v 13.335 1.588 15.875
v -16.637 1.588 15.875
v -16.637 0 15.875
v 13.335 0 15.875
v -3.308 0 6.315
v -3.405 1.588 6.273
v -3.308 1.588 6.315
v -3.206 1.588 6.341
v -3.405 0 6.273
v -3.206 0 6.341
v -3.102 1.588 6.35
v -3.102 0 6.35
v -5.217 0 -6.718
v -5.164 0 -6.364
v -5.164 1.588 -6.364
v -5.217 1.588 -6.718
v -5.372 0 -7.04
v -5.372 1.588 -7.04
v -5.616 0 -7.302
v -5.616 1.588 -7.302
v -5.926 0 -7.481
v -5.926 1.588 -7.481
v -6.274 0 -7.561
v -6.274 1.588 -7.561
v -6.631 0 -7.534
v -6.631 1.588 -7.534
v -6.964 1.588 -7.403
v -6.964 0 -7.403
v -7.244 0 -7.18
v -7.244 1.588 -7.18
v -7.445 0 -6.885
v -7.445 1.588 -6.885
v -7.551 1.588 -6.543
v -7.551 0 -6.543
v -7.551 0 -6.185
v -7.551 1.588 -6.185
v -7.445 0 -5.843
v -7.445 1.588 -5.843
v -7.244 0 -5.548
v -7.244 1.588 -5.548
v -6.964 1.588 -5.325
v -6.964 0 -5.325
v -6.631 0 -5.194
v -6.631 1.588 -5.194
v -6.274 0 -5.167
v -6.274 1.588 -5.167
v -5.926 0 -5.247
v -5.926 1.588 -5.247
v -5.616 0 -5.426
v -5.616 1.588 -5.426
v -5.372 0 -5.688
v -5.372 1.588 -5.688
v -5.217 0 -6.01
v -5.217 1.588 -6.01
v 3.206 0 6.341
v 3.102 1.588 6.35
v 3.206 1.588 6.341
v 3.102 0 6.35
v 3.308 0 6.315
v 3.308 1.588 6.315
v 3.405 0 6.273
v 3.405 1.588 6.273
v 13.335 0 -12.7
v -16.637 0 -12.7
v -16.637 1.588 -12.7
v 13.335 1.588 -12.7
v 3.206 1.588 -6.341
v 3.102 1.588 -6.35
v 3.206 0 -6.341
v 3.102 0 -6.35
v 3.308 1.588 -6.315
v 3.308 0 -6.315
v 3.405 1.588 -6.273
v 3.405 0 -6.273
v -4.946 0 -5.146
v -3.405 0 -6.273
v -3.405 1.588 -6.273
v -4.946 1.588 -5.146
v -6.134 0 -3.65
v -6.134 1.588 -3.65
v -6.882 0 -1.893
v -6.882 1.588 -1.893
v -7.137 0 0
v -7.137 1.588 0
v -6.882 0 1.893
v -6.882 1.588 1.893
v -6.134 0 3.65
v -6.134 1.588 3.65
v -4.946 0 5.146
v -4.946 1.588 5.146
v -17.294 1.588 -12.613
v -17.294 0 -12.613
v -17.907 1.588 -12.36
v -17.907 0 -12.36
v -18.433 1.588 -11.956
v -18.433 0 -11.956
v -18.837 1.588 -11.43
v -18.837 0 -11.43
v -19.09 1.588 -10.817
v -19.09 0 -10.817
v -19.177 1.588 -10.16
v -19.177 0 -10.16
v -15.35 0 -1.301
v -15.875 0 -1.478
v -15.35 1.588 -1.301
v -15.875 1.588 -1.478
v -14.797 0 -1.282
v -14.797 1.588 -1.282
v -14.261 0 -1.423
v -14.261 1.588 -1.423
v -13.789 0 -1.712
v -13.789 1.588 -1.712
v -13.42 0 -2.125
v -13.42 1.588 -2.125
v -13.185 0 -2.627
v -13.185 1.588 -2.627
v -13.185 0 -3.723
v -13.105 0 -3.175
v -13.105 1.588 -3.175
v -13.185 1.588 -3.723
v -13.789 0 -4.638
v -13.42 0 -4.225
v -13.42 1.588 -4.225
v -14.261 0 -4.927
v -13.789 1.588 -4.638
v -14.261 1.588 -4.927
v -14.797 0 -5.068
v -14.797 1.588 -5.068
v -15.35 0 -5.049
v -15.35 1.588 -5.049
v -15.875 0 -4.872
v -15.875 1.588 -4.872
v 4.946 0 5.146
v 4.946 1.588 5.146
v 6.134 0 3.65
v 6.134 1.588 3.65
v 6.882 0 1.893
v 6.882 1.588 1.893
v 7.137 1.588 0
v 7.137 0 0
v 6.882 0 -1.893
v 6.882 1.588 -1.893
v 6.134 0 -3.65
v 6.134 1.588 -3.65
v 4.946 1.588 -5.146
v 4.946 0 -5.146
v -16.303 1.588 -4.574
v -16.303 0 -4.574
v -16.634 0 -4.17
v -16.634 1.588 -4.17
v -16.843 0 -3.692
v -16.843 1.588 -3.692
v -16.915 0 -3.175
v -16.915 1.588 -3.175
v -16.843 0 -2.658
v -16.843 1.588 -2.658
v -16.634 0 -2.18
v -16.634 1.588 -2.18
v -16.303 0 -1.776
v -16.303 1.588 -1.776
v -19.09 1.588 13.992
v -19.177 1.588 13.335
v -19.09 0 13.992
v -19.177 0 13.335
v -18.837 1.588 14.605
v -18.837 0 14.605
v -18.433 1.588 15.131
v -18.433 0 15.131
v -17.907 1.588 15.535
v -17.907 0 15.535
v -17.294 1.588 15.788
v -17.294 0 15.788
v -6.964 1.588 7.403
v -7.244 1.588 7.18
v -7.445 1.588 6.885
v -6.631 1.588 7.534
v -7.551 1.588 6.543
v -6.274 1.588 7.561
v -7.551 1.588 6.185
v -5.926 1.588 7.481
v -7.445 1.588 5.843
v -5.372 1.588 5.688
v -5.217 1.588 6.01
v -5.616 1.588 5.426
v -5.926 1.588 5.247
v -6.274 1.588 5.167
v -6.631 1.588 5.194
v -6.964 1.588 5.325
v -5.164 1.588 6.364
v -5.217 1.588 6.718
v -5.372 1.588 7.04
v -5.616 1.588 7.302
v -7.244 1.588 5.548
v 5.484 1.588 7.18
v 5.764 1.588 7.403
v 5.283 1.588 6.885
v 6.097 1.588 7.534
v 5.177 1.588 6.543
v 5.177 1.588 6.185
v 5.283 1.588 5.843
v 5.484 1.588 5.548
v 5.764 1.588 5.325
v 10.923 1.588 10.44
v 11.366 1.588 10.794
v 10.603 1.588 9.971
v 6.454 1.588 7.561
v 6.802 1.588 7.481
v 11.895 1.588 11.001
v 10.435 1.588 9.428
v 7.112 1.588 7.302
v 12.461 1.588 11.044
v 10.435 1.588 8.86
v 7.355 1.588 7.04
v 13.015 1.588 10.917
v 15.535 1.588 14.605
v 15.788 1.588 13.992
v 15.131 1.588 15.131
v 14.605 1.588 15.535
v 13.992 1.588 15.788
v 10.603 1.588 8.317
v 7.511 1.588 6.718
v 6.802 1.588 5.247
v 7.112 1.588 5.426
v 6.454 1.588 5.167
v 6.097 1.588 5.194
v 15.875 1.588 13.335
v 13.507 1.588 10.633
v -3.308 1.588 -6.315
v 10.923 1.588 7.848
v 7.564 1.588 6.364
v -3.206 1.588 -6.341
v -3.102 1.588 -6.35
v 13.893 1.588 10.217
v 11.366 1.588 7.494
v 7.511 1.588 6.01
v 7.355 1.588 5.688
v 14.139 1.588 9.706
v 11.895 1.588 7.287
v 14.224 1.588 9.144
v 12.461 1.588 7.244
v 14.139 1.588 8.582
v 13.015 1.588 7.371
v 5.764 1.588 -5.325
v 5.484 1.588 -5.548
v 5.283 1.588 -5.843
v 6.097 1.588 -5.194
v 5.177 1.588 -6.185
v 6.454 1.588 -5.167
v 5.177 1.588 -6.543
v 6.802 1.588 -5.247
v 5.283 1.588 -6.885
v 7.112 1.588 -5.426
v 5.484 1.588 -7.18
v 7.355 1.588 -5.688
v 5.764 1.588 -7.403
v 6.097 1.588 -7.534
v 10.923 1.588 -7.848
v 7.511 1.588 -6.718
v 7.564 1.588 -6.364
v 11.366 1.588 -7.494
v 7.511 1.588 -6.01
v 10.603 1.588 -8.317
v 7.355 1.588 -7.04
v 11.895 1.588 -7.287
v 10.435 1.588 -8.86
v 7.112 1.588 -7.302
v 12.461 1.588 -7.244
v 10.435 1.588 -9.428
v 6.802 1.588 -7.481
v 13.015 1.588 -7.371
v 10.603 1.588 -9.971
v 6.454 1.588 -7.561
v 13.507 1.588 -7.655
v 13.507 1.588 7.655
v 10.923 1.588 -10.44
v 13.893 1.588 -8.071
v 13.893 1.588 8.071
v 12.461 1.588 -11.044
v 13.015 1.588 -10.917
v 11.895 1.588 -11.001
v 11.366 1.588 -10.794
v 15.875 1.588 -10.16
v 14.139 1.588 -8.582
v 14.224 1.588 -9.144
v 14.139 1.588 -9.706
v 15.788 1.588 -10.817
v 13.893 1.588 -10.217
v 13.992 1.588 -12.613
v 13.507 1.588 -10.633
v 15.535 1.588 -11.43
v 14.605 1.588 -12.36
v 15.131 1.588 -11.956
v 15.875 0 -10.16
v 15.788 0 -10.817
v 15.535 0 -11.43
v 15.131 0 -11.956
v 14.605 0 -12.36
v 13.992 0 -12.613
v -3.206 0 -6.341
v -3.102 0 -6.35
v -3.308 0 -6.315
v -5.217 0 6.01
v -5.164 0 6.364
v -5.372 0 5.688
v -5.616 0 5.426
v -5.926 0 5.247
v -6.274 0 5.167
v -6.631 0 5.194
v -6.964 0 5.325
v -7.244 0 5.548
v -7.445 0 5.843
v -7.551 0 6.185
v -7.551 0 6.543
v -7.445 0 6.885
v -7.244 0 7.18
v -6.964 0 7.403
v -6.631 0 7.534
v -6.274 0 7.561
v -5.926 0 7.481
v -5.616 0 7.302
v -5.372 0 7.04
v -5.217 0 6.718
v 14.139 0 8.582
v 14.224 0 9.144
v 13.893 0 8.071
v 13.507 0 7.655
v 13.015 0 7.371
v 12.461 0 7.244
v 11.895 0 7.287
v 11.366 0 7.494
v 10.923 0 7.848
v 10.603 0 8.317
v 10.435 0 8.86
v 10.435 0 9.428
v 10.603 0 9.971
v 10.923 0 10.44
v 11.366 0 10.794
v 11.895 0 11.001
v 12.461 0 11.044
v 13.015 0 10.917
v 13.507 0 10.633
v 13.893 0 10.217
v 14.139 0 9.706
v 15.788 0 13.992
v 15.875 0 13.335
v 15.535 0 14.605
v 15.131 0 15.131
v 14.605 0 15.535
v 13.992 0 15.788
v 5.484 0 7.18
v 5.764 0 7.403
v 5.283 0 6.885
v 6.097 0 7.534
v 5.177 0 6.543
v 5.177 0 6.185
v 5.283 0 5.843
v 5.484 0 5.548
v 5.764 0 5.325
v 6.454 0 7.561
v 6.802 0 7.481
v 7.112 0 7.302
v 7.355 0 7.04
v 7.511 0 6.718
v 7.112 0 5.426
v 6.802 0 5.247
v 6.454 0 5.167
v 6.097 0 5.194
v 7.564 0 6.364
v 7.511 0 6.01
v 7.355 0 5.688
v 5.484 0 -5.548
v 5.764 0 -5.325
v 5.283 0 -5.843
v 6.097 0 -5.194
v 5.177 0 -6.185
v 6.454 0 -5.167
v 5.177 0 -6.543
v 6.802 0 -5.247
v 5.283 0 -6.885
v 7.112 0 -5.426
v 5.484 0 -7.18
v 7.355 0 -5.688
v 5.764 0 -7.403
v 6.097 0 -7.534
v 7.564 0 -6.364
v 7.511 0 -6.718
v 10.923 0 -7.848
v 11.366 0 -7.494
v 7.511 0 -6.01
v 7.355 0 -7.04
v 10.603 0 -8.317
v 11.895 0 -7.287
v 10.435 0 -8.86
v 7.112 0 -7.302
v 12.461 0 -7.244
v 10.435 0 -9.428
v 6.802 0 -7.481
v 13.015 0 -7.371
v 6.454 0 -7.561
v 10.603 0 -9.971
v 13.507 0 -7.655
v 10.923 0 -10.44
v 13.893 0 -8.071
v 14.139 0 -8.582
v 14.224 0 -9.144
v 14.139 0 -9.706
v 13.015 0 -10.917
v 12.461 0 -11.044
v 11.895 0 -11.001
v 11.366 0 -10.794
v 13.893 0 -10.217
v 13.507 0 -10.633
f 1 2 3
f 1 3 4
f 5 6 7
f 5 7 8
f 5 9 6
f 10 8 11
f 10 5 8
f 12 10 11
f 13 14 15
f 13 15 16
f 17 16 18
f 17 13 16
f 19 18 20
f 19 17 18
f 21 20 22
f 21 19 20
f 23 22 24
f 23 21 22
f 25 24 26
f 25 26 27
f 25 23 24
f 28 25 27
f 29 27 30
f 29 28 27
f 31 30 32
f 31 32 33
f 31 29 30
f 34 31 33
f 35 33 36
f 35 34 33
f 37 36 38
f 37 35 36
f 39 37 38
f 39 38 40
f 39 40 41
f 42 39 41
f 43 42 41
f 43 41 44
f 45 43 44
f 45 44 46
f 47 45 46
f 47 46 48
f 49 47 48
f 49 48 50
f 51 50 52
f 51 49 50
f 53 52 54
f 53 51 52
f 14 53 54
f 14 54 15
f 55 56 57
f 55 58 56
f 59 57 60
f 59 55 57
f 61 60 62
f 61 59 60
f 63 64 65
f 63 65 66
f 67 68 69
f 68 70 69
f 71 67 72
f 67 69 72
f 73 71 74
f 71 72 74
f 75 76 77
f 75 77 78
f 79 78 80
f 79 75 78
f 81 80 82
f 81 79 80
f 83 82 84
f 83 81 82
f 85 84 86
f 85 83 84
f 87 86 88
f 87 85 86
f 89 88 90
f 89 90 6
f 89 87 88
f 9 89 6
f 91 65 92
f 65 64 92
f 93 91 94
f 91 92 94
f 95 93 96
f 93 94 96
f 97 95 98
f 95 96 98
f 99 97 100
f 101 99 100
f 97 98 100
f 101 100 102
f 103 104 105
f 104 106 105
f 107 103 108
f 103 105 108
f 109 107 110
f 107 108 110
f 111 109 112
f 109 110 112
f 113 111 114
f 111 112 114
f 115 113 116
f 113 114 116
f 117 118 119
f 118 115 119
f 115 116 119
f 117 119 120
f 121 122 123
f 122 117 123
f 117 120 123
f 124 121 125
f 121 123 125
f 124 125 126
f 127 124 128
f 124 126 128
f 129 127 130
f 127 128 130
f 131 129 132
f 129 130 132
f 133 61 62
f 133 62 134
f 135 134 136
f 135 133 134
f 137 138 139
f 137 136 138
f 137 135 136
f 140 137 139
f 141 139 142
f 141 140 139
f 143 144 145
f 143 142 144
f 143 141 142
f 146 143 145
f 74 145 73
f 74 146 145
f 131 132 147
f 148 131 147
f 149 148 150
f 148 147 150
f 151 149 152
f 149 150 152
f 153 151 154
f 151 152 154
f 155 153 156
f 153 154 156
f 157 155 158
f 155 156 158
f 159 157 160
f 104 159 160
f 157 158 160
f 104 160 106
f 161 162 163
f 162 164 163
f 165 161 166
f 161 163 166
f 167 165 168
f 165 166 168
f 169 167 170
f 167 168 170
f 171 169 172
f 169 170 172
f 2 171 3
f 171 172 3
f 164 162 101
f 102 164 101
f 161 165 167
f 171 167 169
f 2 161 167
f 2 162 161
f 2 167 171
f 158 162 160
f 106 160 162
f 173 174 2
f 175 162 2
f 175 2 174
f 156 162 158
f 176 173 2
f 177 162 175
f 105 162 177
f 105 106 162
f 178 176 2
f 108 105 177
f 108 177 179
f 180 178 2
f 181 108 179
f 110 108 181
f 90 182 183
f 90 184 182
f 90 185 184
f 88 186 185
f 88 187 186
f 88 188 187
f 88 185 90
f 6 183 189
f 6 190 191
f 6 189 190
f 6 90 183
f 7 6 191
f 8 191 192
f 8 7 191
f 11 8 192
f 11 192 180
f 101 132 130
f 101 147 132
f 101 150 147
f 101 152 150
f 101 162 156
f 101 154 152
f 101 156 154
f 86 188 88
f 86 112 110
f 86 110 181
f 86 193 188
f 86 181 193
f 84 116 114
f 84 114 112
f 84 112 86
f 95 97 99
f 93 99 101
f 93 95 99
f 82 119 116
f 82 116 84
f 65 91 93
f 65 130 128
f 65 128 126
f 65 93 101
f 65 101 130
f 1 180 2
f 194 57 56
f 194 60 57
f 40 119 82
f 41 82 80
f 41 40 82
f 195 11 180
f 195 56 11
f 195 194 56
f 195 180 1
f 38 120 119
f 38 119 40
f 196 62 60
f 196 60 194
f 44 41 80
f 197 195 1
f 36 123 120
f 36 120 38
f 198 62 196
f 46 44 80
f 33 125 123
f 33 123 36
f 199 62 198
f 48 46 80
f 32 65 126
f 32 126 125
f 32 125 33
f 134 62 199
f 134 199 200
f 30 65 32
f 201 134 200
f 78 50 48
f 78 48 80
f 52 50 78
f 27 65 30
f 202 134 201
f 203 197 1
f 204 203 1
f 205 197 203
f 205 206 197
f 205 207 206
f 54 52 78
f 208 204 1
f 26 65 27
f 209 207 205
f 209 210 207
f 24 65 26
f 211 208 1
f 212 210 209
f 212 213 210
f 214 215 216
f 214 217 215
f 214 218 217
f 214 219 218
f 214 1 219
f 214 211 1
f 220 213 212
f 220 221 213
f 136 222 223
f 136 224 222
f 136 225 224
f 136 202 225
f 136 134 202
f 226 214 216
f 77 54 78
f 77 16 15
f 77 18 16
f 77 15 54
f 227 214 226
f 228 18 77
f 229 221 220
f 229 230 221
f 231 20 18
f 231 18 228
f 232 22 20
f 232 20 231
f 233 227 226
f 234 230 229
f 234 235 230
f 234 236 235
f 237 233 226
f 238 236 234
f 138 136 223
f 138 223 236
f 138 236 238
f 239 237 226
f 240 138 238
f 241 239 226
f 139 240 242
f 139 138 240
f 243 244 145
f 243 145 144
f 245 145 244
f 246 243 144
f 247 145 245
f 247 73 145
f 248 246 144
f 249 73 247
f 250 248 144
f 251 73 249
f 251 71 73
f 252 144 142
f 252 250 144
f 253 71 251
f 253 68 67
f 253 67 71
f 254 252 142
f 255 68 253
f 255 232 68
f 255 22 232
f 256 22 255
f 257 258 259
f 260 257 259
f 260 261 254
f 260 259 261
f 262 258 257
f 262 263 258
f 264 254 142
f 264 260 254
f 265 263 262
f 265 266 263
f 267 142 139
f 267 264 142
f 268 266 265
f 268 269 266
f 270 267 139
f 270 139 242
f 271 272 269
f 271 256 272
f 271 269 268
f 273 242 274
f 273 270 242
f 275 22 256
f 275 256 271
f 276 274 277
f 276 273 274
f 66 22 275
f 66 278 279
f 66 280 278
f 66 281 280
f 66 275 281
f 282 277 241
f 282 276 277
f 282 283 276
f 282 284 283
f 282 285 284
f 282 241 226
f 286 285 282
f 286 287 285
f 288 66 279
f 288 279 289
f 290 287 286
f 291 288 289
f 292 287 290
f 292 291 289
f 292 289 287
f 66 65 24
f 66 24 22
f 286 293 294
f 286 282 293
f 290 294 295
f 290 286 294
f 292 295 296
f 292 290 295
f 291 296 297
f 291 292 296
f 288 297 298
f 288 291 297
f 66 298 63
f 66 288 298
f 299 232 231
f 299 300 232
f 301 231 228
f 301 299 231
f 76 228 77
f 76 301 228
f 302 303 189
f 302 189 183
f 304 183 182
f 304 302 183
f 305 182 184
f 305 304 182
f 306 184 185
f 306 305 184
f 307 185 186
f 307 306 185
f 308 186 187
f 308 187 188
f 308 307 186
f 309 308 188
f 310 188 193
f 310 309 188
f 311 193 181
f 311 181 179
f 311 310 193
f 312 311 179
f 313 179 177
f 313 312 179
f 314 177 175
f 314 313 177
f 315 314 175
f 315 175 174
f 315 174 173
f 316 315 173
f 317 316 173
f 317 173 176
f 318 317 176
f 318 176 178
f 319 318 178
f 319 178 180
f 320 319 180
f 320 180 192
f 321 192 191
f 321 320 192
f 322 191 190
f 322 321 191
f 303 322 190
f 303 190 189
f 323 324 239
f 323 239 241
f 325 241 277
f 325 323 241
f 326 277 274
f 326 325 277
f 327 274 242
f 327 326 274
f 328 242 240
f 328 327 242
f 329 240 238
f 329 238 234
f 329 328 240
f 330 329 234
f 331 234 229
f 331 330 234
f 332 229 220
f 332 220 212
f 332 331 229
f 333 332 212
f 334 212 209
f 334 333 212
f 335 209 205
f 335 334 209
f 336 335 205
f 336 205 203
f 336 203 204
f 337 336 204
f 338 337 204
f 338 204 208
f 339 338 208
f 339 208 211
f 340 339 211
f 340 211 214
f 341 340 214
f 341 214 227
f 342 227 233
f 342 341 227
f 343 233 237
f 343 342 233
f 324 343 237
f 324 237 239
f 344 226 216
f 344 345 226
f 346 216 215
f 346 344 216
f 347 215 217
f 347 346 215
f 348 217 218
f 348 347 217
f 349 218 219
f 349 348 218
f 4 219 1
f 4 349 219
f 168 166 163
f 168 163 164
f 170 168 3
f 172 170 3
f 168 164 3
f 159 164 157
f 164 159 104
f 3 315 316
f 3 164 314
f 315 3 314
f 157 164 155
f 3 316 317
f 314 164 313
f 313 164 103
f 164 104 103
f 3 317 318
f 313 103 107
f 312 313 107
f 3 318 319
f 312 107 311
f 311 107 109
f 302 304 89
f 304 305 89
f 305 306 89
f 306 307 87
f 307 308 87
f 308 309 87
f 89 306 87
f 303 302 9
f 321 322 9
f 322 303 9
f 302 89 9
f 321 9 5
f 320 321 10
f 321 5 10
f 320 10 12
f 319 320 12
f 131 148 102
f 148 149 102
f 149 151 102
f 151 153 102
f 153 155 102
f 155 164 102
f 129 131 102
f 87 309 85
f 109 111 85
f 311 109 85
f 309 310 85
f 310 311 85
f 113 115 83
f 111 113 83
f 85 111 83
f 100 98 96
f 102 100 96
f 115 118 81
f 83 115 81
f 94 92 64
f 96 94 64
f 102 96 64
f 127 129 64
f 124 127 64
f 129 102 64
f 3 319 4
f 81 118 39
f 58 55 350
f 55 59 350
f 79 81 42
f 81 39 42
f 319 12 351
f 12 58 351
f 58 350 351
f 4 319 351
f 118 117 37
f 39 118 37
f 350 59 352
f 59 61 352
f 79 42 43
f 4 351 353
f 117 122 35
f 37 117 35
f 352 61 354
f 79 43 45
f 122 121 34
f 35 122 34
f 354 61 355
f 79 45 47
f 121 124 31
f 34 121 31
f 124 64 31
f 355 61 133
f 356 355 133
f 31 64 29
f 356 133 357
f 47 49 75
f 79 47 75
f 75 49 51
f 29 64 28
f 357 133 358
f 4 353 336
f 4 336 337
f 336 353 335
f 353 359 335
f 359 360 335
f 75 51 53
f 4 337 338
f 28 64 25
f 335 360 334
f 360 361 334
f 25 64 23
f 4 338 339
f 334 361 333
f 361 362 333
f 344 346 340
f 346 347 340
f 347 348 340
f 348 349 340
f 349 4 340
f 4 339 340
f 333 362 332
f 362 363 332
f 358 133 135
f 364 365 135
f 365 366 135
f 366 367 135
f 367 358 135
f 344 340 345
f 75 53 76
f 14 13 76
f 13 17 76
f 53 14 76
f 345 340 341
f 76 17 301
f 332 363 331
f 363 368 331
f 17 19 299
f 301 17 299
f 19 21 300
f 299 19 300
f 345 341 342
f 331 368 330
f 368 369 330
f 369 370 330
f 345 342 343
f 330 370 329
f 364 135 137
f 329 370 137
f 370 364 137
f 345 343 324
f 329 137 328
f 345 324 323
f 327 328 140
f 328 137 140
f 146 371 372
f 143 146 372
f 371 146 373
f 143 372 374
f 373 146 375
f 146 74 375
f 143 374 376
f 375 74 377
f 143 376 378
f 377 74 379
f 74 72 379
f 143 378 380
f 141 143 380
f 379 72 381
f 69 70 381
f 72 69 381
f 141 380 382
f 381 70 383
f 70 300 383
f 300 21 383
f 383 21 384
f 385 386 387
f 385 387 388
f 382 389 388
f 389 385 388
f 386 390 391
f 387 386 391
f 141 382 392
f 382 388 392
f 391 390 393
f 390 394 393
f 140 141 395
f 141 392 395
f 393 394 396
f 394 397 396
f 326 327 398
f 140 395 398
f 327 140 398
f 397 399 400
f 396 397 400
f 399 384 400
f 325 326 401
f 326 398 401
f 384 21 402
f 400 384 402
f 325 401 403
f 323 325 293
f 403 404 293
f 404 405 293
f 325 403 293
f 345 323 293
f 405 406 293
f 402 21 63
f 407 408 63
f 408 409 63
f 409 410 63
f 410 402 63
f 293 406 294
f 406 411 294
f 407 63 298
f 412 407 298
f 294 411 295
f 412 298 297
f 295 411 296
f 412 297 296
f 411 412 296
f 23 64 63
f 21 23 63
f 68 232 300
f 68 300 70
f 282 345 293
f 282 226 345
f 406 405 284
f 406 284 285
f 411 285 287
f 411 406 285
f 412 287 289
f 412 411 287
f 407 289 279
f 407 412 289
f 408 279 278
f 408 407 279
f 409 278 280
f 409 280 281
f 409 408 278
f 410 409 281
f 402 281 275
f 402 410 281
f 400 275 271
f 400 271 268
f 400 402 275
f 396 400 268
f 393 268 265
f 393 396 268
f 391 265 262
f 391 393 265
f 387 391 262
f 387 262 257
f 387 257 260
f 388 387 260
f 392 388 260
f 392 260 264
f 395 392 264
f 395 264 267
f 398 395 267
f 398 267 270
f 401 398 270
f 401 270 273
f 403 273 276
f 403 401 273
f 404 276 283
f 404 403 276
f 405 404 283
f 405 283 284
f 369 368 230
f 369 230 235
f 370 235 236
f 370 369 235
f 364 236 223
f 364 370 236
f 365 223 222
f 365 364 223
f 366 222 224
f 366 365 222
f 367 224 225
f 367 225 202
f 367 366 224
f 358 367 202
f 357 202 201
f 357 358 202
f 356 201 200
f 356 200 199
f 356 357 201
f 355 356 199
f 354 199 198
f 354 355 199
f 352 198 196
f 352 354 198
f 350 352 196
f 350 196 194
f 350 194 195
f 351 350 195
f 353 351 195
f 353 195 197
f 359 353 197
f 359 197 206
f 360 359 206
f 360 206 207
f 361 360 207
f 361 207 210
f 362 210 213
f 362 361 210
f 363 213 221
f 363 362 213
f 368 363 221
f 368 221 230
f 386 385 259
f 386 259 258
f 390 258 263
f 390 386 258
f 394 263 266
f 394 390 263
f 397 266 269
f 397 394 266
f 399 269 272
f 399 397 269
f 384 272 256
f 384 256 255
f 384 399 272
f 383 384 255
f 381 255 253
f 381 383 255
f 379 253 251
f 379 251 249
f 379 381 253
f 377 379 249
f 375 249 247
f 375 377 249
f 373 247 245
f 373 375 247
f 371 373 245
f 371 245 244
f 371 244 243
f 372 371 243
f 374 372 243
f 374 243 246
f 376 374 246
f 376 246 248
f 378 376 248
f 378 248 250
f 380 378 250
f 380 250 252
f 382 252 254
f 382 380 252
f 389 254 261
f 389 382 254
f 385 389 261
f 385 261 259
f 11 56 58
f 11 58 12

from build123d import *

# Parameters (mm, degrees)
SKETCH1_W           = 31.75
SKETCH1_H           = 25.4
SKETCH1_R           = 7.1374
SKETCH1_R_2         = 1.2
SKETCH1_R_3         = 1.905
BOSS_EXTRUDE1_DEPTH = 1.5875
SKETCH2_W           = 31.75
SKETCH2_H           = 3.175
BOSS_EXTRUDE2_DEPTH = 1.5875
SKETCH5_R           = 1.905
BOSS_EXTRUDE4_DEPTH = 1.5875
SKETCH6_R           = 1.905
CUT_EXTRUDE1_DEPTH  = 2.5875
BOSS_EXTRUDE3_DEPTH = 1.5875
FILLET2_R           = 0.635
FILLET3_R           = 2.54


with BuildPart() as part:
    # Sketch1 → Boss-Extrude1 (new body)
    with BuildSketch(Plane(origin=(0, 0, 0), x_dir=(1, 0, 0), z_dir=(0, 1, 0))):
        Rectangle(SKETCH1_W, SKETCH1_H)
        Circle(SKETCH1_R, mode=Mode.SUBTRACT)
        with Locations((-6.363961031, -6.363961031)):
            Circle(SKETCH1_R_2, mode=Mode.SUBTRACT)
        with Locations((-6.363961031, 6.363961031)):
            Circle(SKETCH1_R_2, mode=Mode.SUBTRACT)
        with Locations((6.363961031, 6.363961031)):
            Circle(SKETCH1_R_2, mode=Mode.SUBTRACT)
        with Locations((6.363961031, -6.363961031)):
            Circle(SKETCH1_R_2, mode=Mode.SUBTRACT)
        with Locations((-12.319, -9.144)):
            Circle(SKETCH1_R_3, mode=Mode.SUBTRACT)
        with Locations((-12.319, 9.144)):
            Circle(SKETCH1_R_3, mode=Mode.SUBTRACT)
        with Locations((12.319, 9.144)):
            Circle(SKETCH1_R_3, mode=Mode.SUBTRACT)
        with Locations((12.319, -9.144)):
            Circle(SKETCH1_R_3, mode=Mode.SUBTRACT)
    extrude(amount=BOSS_EXTRUDE1_DEPTH)

    # Sketch2 → Boss-Extrude2 (add, through all)
    with BuildSketch(Plane(origin=(0, 1.5875, 0), x_dir=(1, 0, 0), z_dir=(0, 1, 0))):
        with Locations((0, -14.2875)):
            Rectangle(SKETCH2_W, SKETCH2_H)
    extrude(amount=-BOSS_EXTRUDE2_DEPTH)

    # Sketch5 → Boss-Extrude4 (add, through all)
    with BuildSketch(Plane(origin=(0, 1.5875, 0), x_dir=(1, 0, 0), z_dir=(0, 1, 0))):
        with Locations((-12.319, 9.144)):
            Circle(SKETCH5_R)
        with Locations((-12.319, -9.144)):
            Circle(SKETCH5_R)
        with BuildLine():
            Line((-19.177, 12.7), (-15.875, 12.7))
            Line((-15.875, 12.7), (-15.875, 4.87211828))
            ThreePointArc((-15.875, 4.87211828), (-16.91465929, 3.175), (-15.875, 1.47788172))
            Line((-15.875, 1.47788172), (-15.875, -15.875))
            Line((-15.875, -15.875), (-19.177, -15.875))
            Line((-19.177, -15.875), (-19.177, 12.7))
        make_face()
    extrude(amount=-BOSS_EXTRUDE4_DEPTH)

    # Sketch6 → Cut-Extrude1 (cut, through all)
    with BuildSketch(Plane(origin=(0, 1.5875, 0), x_dir=(1, 0, 0), z_dir=(0, 1, 0))):
        with Locations((-15.00965929, 3.175)):
            Circle(SKETCH6_R)
    extrude(amount=-CUT_EXTRUDE1_DEPTH, mode=Mode.SUBTRACT)

    # Sketch3 → Boss-Extrude3 (add, through all)
    with BuildSketch(Plane(origin=(0, 1.5875, 0), x_dir=(1, 0, 0), z_dir=(0, 1, 0))):
        with BuildLine():
            Line((-3.258830889, 6.35), (3.258830889, 6.35))
            ThreePointArc((3.258830889, 6.35), (0, 7.1374), (-3.258830889, 6.35))
        make_face()
        with BuildLine():
            Line((3.258830889, -6.35), (-3.258830889, -6.35))
            ThreePointArc((-3.258830889, -6.35), (0, -7.1374), (3.258830889, -6.35))
        make_face()
    extrude(amount=-BOSS_EXTRUDE3_DEPTH)

    # Fillet2
    fillet2_edges = [part.edges().sort_by_distance(p)[0] for p in [
        (-3.258830889, 0.79375, -6.35),
        (3.258830889, 0.79375, -6.35),
        (3.258830889, 0.79375, 6.35),
        (-3.258830889, 0.79375, 6.35),
    ]]
    fillet(fillet2_edges, radius=FILLET2_R)

    # Fillet3
    fillet3_edges = [part.edges().sort_by_distance(p)[0] for p in [
        (15.875, 0.79375, 15.875),
        (-19.177, 0.79375, 15.875),
        (-19.177, 0.79375, -12.7),
        (15.875, 0.79375, -12.7),
    ]]
    fillet(fillet3_edges, radius=FILLET3_R)


solid = part.part
